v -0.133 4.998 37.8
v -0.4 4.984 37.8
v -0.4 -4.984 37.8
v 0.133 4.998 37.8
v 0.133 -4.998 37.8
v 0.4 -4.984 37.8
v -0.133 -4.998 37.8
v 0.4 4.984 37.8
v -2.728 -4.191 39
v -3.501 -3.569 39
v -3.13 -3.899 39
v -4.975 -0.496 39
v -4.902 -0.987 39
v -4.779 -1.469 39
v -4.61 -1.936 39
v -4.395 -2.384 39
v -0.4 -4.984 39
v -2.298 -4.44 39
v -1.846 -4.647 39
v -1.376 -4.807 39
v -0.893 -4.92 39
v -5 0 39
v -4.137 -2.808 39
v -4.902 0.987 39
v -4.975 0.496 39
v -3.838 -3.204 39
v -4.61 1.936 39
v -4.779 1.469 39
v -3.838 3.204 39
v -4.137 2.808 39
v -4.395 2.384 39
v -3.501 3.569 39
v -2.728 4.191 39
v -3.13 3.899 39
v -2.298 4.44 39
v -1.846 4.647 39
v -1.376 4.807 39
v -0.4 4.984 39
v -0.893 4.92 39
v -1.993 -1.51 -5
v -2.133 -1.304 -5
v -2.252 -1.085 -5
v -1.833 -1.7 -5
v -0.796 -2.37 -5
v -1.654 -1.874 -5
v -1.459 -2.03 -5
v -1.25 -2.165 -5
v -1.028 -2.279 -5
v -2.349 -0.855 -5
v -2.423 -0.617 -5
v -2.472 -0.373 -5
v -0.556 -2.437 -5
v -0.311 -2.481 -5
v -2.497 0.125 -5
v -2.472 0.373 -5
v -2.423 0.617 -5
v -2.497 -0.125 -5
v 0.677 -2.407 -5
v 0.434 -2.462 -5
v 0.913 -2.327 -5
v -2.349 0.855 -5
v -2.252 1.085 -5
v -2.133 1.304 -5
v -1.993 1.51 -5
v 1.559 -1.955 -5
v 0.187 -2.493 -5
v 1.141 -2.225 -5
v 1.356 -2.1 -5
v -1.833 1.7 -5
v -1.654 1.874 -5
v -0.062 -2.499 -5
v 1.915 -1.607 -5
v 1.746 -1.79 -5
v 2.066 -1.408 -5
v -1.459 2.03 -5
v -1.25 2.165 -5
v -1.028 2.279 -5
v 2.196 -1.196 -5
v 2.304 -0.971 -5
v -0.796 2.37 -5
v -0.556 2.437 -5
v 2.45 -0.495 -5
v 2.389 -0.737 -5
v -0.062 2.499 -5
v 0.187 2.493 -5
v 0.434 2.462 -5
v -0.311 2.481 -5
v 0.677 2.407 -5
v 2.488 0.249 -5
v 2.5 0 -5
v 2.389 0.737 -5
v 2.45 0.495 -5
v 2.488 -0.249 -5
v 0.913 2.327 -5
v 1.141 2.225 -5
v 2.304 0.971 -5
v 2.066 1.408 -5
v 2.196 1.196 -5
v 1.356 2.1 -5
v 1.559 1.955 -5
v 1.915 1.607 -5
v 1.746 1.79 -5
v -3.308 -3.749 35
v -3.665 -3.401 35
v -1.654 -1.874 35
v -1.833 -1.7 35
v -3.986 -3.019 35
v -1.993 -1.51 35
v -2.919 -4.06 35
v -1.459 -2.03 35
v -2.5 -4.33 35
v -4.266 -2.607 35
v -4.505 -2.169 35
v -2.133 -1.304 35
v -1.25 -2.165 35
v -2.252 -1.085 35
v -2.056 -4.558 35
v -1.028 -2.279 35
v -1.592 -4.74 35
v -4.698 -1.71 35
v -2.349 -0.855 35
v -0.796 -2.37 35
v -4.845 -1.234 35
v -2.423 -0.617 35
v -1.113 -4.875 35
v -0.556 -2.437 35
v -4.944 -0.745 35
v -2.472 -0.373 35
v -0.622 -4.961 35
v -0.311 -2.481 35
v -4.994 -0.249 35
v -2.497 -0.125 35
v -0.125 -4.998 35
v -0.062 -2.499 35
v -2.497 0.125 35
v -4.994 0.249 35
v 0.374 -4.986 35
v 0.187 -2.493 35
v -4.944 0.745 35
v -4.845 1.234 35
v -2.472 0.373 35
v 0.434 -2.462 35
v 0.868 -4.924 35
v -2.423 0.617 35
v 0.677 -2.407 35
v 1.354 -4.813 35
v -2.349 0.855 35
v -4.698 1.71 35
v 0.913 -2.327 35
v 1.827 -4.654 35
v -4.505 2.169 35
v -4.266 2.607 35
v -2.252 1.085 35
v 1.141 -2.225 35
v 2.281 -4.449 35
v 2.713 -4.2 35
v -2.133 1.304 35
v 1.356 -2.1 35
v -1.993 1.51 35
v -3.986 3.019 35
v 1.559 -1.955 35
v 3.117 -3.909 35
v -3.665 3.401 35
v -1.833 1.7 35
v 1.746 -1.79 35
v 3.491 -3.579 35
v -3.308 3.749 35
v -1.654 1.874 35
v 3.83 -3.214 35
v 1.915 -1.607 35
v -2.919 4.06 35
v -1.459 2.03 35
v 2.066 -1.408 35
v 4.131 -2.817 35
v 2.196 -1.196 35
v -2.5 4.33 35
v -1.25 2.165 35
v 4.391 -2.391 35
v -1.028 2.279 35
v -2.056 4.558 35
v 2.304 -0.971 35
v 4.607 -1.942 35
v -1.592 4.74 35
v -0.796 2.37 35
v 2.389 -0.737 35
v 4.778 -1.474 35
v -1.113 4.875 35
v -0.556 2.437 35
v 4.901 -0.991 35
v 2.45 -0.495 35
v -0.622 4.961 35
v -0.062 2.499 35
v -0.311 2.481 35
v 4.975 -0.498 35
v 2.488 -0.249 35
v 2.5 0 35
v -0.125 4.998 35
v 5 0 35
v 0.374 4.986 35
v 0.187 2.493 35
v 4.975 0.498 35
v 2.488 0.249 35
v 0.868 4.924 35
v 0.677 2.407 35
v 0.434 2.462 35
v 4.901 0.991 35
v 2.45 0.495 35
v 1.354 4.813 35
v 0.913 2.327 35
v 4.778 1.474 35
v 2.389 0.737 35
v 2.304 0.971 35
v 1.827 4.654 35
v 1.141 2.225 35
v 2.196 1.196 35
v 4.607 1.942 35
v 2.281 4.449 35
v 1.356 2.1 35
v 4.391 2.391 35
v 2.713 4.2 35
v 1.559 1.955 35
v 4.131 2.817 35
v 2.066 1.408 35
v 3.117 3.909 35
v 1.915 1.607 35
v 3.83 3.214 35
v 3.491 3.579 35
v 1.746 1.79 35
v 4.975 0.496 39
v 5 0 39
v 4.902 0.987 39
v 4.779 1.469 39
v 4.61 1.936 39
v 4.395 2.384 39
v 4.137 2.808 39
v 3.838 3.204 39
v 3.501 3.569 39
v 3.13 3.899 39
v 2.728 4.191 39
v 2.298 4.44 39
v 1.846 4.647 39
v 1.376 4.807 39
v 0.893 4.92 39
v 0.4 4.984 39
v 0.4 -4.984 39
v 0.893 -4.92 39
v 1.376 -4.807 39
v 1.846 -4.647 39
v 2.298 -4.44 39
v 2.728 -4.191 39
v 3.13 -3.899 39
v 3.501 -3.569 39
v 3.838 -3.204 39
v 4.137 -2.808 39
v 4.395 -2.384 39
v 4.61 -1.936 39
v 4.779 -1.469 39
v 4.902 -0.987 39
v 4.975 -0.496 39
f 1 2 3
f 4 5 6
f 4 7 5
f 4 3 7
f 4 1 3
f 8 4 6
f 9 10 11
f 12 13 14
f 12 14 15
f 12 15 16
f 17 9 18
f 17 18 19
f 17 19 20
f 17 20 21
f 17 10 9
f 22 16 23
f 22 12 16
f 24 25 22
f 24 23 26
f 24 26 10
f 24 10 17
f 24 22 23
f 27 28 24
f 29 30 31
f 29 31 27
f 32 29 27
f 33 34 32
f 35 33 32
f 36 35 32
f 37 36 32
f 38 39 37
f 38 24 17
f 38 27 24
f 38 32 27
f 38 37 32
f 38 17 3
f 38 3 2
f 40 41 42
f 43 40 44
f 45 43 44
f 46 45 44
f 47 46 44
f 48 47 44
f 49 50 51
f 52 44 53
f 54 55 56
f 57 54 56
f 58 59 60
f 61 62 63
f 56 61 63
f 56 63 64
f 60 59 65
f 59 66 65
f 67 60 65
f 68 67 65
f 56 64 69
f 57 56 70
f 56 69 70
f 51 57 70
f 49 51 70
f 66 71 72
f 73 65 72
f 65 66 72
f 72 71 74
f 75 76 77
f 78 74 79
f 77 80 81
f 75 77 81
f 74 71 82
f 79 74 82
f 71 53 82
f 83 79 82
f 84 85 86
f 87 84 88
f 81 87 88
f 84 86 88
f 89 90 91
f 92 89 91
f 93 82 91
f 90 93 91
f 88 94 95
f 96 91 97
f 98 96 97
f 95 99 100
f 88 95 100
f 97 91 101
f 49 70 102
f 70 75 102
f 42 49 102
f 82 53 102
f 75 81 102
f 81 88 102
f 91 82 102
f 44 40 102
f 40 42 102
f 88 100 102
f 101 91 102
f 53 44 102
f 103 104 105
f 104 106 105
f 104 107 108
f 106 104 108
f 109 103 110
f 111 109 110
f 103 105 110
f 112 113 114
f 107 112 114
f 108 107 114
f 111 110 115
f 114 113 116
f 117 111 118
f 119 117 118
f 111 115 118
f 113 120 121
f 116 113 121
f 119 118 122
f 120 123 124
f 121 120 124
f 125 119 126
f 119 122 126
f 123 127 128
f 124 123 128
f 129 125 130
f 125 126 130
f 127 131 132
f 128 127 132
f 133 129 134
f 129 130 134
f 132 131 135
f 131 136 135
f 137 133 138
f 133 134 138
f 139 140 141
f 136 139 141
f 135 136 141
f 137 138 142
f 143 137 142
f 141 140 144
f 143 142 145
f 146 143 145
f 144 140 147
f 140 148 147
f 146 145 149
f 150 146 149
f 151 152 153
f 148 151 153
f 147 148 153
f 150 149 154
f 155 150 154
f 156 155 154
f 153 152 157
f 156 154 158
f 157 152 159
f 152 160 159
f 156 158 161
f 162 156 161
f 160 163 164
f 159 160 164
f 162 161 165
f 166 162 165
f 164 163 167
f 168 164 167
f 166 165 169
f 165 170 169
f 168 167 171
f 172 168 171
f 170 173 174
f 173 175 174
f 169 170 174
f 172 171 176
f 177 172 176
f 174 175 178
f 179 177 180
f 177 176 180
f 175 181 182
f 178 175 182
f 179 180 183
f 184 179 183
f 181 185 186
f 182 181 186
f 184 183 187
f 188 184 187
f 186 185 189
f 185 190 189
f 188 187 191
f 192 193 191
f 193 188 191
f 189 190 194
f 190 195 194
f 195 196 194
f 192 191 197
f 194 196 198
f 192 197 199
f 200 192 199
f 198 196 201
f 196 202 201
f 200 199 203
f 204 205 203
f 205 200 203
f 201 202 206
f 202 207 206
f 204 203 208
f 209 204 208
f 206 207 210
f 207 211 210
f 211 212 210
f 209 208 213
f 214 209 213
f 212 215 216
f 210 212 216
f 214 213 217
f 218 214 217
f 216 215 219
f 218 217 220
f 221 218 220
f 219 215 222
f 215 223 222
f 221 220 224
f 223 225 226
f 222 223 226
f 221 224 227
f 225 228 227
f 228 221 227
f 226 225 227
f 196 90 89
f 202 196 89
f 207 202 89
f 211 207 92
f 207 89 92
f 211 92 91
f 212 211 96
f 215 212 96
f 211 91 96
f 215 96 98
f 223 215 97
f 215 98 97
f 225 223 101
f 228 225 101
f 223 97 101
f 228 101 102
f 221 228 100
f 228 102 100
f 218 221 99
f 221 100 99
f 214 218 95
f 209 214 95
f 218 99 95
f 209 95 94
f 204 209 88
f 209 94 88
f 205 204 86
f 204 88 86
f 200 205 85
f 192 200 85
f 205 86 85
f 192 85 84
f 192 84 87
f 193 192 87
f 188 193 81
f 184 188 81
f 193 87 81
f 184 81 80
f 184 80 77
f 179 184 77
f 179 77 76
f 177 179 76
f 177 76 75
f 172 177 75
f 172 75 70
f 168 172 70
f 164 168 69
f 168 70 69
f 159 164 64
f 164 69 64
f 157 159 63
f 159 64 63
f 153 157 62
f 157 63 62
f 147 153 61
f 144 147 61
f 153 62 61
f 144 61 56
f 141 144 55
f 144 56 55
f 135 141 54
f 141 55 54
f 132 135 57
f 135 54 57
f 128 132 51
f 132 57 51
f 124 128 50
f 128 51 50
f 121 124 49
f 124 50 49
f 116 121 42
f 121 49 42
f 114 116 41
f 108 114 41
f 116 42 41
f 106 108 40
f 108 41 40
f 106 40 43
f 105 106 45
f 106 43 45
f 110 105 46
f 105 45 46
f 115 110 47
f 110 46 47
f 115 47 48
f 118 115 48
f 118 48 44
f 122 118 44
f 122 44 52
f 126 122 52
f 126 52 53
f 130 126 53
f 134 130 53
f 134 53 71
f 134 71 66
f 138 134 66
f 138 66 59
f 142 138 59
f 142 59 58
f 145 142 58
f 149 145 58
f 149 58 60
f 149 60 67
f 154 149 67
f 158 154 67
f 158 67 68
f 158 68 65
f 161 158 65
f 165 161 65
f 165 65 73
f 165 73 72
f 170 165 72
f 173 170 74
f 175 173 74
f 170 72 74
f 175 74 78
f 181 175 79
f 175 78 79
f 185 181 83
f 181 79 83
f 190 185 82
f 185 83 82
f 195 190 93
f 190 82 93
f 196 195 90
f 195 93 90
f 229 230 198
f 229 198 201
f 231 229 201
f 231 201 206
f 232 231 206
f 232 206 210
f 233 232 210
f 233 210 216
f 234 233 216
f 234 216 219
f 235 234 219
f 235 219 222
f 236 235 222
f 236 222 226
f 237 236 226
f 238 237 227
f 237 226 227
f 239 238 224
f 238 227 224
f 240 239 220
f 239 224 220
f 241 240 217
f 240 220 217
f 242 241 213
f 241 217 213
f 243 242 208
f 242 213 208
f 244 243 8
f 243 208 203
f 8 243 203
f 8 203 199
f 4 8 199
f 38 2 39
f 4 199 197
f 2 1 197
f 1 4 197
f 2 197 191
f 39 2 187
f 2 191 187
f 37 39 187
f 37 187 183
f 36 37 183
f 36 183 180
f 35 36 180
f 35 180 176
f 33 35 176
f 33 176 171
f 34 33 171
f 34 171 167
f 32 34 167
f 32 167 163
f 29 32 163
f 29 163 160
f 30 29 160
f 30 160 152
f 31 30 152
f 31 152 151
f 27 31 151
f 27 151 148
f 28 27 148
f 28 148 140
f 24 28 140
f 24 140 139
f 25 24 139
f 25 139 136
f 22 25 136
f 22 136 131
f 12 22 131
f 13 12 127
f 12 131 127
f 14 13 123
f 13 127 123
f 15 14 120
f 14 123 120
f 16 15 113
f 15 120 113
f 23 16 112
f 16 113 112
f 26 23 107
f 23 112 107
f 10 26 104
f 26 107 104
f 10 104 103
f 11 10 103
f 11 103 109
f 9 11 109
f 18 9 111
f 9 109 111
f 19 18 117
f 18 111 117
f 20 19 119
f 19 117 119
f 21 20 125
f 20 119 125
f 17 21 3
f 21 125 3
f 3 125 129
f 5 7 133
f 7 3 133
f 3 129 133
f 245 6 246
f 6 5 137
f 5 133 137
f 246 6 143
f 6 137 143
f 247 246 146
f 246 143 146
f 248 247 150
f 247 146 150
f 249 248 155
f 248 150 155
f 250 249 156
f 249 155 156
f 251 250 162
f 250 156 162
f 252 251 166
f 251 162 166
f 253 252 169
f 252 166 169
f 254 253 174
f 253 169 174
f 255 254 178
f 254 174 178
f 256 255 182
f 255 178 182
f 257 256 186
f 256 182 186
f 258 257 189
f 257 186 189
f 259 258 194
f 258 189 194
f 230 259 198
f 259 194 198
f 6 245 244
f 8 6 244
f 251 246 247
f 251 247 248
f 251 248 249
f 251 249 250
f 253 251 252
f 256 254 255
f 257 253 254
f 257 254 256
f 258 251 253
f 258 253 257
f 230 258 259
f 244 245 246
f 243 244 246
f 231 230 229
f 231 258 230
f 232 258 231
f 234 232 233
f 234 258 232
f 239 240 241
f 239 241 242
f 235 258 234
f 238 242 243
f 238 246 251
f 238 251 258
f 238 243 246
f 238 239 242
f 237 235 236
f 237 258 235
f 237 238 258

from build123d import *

# Parameters (mm, degrees)
EXTRUDE_1_DEPTH      = 35
EXTRUDE_1_DEPTH_BACK = 5
SKETCH_1_R           = 2.5
SKETCH_2_R           = 5
EXTRUDE_2_DEPTH      = 4
SKETCH_3_W           = 0.8
SKETCH_3_H           = 11.021006482
CUT_EXTRUDE_1_DEPTH  = 1.2


with BuildPart() as part:
    # Эскиз1 → Вытянуть1 (new, two sides: drawn at the far end of the back side and taken through both)
    with BuildSketch(Plane.XY.offset(-EXTRUDE_1_DEPTH_BACK)):
        Circle(SKETCH_1_R)
    extrude(amount=EXTRUDE_1_DEPTH + EXTRUDE_1_DEPTH_BACK)

    # Эскиз2 → Вытянуть2 (add)
    with BuildSketch(Plane.XY.offset(35)):
        Circle(SKETCH_2_R)
    extrude(amount=EXTRUDE_2_DEPTH)

    # Эскиз3 → Вырез-Вытянуть1 (cut)
    with BuildSketch(Plane.XY.offset(39)):
        with Locations((0, 0.044379892)):
            Rectangle(SKETCH_3_W, SKETCH_3_H)
    extrude(amount=-CUT_EXTRUDE_1_DEPTH, mode=Mode.SUBTRACT)


solid = part.part
